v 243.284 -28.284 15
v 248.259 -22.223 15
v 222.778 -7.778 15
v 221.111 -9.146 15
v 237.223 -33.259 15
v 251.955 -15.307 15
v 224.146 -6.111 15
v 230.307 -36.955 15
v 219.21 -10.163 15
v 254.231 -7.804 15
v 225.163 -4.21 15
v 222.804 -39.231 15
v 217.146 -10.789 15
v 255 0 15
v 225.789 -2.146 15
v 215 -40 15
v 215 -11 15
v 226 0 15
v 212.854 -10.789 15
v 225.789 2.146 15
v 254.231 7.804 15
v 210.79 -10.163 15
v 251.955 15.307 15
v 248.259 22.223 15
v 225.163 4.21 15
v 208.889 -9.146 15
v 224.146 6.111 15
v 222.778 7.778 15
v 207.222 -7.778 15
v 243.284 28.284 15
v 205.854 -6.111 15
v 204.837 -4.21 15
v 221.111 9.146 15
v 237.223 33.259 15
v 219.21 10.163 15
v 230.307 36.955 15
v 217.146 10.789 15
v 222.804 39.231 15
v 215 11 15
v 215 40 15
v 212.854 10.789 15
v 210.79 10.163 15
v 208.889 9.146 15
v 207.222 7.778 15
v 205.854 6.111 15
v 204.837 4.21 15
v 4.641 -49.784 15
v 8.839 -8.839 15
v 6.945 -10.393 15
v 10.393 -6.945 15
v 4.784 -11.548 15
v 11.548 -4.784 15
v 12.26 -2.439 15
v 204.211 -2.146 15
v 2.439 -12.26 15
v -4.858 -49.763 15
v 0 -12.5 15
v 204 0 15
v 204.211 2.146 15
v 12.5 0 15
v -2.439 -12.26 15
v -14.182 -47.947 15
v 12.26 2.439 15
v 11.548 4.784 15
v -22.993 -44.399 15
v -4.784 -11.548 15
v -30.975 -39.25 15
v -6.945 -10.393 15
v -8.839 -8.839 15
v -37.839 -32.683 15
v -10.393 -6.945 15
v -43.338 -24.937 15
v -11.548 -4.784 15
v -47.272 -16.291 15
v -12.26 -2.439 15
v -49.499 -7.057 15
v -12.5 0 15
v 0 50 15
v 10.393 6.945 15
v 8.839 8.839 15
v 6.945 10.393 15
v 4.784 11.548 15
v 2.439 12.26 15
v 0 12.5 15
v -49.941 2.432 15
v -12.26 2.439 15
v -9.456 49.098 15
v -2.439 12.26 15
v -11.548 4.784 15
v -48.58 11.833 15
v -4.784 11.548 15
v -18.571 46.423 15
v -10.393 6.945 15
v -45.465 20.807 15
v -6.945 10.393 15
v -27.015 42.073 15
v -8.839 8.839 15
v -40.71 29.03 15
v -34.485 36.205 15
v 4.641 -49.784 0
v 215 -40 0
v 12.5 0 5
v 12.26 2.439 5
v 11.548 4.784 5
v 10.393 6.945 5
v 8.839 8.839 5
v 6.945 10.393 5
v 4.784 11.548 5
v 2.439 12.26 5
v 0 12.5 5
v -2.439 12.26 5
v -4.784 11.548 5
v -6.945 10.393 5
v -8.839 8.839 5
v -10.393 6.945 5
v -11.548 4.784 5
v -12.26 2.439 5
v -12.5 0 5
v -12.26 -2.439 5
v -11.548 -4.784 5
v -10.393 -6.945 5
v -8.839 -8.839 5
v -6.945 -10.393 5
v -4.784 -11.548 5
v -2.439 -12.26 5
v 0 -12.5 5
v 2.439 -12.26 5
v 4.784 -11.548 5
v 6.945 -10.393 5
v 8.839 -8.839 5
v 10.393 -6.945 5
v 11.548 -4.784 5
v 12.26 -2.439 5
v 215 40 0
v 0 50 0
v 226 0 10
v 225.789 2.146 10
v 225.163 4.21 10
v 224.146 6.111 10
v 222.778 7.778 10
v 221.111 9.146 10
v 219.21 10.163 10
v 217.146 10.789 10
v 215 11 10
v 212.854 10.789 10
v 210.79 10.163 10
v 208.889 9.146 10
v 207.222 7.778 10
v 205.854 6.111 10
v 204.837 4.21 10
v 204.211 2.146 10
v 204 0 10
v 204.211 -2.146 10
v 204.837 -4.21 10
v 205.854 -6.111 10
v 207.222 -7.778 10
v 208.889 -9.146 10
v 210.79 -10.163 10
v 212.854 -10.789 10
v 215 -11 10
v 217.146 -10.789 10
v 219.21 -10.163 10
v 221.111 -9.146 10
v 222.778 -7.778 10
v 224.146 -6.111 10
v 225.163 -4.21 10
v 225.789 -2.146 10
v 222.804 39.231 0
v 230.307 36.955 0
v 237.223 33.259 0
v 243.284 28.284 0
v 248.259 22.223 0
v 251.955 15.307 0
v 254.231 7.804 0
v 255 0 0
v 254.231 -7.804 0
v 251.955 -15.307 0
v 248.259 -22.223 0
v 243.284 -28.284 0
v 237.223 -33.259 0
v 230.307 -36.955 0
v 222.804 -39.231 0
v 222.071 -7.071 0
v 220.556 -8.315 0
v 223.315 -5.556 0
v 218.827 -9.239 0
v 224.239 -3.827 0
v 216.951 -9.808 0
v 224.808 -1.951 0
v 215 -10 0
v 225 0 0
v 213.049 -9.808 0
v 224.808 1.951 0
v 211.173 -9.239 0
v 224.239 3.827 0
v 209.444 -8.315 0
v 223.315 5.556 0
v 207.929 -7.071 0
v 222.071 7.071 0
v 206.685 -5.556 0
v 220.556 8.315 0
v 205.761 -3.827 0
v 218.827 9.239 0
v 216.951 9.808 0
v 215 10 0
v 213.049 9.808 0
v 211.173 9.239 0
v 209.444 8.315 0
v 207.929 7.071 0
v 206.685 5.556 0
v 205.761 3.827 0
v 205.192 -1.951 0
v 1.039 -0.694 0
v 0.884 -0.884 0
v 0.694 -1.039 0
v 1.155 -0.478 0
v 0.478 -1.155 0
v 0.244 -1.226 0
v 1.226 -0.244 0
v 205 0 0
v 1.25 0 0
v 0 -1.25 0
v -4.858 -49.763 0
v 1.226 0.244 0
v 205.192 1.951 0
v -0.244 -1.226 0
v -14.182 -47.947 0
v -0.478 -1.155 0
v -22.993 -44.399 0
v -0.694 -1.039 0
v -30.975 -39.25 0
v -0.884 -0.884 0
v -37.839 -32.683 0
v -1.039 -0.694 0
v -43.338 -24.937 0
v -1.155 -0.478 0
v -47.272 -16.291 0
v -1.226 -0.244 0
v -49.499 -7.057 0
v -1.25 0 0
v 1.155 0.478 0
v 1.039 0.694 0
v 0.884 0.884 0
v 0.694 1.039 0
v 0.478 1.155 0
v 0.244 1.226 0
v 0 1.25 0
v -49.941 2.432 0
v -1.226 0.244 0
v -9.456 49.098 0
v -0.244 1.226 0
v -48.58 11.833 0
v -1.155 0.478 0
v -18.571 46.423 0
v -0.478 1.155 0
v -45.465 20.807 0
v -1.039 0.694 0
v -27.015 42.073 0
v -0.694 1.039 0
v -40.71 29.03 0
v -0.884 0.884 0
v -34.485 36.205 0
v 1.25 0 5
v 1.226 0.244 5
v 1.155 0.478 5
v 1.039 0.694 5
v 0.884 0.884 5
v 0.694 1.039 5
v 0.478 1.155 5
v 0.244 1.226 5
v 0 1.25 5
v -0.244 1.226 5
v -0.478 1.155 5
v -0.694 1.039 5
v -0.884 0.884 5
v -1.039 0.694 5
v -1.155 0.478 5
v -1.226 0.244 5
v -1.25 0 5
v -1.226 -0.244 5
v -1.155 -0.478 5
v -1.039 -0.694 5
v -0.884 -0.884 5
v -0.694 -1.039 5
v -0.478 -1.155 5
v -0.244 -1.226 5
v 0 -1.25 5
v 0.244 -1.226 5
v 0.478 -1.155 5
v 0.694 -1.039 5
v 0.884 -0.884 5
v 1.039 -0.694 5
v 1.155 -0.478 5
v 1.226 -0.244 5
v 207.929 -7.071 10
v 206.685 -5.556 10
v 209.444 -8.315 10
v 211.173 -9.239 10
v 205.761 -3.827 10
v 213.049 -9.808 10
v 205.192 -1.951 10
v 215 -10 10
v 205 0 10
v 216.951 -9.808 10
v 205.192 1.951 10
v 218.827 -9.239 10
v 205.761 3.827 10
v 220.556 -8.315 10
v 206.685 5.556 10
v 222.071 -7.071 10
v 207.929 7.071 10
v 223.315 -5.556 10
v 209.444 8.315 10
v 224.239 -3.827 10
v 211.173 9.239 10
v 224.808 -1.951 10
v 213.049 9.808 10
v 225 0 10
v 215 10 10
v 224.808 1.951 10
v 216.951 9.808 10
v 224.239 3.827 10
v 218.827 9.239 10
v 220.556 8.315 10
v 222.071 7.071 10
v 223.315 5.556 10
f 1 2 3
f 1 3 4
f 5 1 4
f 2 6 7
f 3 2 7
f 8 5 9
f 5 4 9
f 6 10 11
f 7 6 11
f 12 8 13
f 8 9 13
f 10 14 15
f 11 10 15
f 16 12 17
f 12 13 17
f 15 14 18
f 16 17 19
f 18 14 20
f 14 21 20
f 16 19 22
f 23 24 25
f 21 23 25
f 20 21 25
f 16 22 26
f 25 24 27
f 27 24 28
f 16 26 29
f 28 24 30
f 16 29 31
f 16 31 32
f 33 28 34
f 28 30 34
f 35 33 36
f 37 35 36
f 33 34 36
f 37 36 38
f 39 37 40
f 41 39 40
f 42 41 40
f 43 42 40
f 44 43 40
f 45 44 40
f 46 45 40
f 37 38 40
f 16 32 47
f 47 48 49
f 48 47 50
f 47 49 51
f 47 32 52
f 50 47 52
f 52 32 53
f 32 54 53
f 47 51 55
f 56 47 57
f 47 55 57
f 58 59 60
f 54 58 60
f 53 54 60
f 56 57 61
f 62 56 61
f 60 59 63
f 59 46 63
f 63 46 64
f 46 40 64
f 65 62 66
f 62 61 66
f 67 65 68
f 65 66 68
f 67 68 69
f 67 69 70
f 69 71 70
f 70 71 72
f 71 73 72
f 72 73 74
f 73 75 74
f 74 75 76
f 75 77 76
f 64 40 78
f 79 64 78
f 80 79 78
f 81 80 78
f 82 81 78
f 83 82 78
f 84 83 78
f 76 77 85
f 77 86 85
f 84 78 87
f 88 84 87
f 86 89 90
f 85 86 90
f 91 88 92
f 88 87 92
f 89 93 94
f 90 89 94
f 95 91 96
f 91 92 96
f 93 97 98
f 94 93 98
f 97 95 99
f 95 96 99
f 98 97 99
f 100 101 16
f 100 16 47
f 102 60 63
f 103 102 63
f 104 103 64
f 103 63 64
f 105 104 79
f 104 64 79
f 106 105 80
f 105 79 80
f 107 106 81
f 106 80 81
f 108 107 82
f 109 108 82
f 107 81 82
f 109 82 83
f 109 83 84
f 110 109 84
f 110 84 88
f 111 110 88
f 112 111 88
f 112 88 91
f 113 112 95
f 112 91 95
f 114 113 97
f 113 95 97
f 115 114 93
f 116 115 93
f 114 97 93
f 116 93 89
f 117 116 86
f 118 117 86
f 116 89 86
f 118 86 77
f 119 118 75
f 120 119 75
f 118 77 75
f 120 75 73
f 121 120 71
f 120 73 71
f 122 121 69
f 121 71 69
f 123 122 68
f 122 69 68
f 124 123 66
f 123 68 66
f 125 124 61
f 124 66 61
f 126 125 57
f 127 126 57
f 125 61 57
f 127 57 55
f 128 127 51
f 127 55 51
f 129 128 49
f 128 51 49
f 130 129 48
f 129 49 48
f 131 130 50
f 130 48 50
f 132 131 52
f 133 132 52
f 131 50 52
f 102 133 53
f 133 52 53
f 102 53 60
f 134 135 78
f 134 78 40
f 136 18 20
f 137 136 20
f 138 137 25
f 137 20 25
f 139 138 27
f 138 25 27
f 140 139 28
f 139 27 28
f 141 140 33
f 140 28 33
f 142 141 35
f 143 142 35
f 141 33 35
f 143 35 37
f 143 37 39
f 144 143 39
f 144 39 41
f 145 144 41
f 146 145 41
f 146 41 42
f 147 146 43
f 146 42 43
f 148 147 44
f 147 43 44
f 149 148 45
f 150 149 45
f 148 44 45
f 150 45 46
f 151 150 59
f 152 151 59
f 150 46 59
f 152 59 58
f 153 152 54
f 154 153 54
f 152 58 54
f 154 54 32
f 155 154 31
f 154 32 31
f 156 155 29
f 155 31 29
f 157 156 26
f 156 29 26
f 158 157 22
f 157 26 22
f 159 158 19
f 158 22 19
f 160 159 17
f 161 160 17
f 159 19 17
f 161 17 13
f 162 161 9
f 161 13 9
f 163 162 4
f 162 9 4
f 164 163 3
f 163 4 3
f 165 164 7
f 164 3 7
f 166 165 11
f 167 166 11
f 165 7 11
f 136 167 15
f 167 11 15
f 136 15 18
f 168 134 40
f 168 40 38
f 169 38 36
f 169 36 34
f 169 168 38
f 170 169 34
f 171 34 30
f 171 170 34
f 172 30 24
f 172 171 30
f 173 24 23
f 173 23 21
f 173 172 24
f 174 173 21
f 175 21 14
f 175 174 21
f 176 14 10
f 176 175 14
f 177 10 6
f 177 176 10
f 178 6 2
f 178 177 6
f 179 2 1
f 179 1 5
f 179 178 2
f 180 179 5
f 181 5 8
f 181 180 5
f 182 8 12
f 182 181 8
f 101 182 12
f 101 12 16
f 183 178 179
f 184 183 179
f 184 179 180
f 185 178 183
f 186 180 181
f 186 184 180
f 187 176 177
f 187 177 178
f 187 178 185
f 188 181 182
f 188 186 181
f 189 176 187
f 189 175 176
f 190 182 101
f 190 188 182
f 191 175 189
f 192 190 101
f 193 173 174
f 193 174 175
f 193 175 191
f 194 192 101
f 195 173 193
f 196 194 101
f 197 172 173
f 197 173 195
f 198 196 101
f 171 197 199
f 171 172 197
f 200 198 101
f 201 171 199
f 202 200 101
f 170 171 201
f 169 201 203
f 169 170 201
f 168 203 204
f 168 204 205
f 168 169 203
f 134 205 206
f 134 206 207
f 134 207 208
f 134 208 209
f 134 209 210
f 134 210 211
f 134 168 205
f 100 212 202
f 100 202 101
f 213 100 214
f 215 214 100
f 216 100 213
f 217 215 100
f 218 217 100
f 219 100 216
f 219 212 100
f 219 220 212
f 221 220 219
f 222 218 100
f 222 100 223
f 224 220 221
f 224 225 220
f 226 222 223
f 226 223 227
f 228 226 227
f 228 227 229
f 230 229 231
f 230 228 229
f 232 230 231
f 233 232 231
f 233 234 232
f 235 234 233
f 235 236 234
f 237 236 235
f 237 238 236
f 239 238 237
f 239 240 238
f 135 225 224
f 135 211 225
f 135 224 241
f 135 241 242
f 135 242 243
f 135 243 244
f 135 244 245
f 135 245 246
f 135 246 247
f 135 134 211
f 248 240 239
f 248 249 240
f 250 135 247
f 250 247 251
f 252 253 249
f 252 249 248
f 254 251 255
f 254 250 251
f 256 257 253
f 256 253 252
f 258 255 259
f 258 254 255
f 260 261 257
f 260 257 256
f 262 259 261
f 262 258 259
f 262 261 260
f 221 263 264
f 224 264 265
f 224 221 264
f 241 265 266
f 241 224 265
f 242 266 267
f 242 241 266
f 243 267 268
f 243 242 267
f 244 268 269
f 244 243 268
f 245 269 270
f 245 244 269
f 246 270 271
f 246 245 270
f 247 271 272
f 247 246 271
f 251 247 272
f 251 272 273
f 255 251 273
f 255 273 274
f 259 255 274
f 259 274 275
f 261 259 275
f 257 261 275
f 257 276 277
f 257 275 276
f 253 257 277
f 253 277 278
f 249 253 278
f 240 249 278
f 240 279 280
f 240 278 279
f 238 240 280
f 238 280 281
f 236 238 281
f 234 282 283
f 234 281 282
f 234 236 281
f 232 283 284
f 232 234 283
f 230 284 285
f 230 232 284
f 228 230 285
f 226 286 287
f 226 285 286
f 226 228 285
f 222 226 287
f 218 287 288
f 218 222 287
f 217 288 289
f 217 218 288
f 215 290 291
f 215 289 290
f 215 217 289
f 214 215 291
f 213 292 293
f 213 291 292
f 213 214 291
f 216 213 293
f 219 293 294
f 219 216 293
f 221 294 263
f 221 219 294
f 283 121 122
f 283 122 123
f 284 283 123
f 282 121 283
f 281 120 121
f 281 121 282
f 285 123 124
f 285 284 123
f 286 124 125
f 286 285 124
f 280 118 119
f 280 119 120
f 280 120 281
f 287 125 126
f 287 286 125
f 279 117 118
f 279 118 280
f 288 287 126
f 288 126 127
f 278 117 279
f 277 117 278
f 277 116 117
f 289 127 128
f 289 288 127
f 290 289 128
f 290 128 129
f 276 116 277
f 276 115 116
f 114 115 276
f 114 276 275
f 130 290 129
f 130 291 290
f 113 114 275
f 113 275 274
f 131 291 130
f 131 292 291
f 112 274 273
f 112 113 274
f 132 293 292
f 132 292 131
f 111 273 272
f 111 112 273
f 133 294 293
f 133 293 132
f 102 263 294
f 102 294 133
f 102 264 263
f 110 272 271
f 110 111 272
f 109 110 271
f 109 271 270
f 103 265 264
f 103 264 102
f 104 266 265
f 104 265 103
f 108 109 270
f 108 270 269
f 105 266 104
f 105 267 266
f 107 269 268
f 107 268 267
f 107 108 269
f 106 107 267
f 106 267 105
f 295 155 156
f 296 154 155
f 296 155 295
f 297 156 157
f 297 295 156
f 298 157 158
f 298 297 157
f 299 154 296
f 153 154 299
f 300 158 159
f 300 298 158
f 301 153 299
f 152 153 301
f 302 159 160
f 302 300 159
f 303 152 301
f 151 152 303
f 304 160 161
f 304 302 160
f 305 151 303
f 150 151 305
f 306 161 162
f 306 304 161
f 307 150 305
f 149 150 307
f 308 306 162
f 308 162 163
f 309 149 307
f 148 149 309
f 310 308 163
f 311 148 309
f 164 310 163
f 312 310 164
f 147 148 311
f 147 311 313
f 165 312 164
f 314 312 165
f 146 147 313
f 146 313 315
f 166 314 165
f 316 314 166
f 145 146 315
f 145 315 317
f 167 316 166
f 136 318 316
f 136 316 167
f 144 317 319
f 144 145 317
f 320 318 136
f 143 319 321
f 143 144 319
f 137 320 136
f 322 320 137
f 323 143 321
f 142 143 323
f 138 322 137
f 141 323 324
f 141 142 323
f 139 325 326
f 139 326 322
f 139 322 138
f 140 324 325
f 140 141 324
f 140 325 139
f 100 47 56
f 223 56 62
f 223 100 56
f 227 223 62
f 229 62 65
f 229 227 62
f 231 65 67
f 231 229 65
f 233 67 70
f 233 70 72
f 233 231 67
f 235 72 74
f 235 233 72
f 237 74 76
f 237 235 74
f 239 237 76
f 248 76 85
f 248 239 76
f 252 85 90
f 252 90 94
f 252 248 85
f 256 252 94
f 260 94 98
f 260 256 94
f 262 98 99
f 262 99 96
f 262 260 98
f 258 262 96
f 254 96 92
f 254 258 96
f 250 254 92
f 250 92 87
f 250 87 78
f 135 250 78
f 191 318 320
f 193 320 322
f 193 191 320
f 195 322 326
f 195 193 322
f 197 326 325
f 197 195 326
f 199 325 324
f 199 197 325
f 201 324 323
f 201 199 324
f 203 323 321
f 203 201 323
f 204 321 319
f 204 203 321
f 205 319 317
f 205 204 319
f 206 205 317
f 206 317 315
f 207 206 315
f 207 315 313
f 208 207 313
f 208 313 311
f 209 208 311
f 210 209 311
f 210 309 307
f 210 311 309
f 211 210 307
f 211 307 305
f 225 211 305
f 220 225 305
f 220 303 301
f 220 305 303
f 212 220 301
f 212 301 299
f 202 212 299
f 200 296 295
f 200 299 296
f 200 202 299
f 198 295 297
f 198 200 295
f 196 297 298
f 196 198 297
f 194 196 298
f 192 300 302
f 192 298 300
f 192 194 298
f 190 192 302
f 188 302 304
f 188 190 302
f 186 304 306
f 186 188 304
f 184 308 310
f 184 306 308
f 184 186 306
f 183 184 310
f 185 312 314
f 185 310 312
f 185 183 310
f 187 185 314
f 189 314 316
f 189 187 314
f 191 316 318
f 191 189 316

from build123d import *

# Parameters (mm, degrees)
CROQUIS1_R              = 1.25
CROQUIS1_R_2            = 10
SALIENTE_EXTRUIR1_DEPTH = 15
CROQUIS2_R              = 12.5
CORTAR_EXTRUIR1_DEPTH   = 10
CROQUIS3_R              = 11
CORTAR_EXTRUIR2_DEPTH   = 5


with BuildPart() as part:
    # Croquis1 → Saliente-Extruir1 (new body)
    with BuildSketch(Plane.XY):
        with BuildLine():
            Line((0, 50), (215, 40))
            ThreePointArc((215, 40), (255, 0), (215, -40))
            Line((215, -40), (4.641122504, -49.784133837))
            ThreePointArc((4.641122504, -49.784133837), (-49.946004304, -2.323069968), (0, 50))
        make_face()
        Circle(CROQUIS1_R, mode=Mode.SUBTRACT)
        with Locations((215, 0)):
            Circle(CROQUIS1_R_2, mode=Mode.SUBTRACT)
    extrude(amount=SALIENTE_EXTRUIR1_DEPTH)

    # Croquis2 → Cortar-Extruir1 (cut)
    with BuildSketch(Plane.XY.offset(15)):
        Circle(CROQUIS2_R)
    extrude(amount=-CORTAR_EXTRUIR1_DEPTH, mode=Mode.SUBTRACT)

    # Croquis3 → Cortar-Extruir2 (cut)
    with BuildSketch(Plane.XY.offset(15)):
        with Locations((215, 0)):
            Circle(CROQUIS3_R)
    extrude(amount=-CORTAR_EXTRUIR2_DEPTH, mode=Mode.SUBTRACT)


solid = part.part
